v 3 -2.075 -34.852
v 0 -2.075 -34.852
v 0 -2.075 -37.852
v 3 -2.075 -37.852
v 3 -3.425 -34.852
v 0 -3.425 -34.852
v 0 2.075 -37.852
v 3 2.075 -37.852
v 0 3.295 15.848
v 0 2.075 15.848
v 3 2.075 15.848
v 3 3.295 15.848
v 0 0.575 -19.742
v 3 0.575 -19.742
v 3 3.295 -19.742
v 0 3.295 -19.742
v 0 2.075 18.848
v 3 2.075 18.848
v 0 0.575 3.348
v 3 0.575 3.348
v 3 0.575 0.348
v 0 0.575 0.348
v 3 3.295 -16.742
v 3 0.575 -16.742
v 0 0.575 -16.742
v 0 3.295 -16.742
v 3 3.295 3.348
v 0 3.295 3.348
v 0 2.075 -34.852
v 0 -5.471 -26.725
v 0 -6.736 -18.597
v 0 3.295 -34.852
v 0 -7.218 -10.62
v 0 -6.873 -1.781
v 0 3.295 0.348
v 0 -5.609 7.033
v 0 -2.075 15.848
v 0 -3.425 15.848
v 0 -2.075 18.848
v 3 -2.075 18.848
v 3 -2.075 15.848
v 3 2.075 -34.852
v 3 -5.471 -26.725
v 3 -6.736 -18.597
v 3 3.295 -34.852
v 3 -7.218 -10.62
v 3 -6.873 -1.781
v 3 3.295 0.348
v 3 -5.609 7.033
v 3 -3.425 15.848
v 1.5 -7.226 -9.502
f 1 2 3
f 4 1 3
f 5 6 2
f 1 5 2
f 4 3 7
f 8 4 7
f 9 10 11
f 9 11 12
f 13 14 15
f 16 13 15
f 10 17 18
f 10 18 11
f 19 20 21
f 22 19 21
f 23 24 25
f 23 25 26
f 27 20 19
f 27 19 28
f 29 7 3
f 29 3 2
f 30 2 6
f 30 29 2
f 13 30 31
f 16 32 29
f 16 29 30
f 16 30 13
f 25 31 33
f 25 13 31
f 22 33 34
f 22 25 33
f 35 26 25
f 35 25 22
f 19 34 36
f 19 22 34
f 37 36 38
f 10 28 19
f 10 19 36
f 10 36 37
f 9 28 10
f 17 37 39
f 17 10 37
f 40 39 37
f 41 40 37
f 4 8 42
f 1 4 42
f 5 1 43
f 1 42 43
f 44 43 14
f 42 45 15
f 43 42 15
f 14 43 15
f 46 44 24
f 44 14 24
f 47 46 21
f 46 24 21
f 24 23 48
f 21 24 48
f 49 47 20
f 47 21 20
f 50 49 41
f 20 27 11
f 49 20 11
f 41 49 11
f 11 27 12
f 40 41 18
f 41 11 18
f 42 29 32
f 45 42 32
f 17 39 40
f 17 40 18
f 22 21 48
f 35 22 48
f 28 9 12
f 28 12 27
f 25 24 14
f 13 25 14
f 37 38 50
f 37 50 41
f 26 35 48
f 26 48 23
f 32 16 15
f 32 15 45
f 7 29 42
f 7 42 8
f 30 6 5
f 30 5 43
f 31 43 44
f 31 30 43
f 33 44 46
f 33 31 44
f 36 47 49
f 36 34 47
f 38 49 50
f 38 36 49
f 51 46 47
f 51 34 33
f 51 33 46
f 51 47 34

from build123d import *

# Parameters (mm, degrees)
SKICA3_W                 = 50.7
SKICA3_H                 = 6.72
P_IDAT_VYSUNUT_M1_DEPTH  = 3
SKICA3_3_W               = 3
SKICA3_3_H               = 4.15
P_IDAT_VYSUNUT_M2_DEPTH  = 3
SKICA3_4_W               = 3
SKICA3_4_H               = 4.15
P_IDAT_VYSUNUT_M3_DEPTH  = 3
P_IDAT_VYSUNUT_M4_DEPTH  = 3
SKICA5_W                 = 3
SKICA5_H                 = 5.420631859
ODEBRAT_VYSUNUT_M1_DEPTH = 3


with BuildPart() as part:
    # Skica3 → Přidat vysunutím1 (new body)
    with BuildSketch(Plane(origin=(0, 0, 0), x_dir=(0, 0, -1), z_dir=(1, 0, 0))):
        with Locations((9.501921455, -0.065)):
            Rectangle(SKICA3_W, SKICA3_H)
    extrude(amount=P_IDAT_VYSUNUT_M1_DEPTH)

    # Skica3<3> → Přidat vysunutím2 (add)
    with BuildSketch(Plane(origin=(0, 0, 0), x_dir=(0, 0, -1), z_dir=(1, 0, 0))):
        with Locations((36.351921455, 0)):
            Rectangle(SKICA3_3_W, SKICA3_3_H)
    extrude(amount=P_IDAT_VYSUNUT_M2_DEPTH)

    # Skica3<4> → Přidat vysunutím3 (add)
    with BuildSketch(Plane(origin=(0, 0, 0), x_dir=(0, 0, -1), z_dir=(1, 0, 0))):
        with Locations((-17.348078545, 0)):
            Rectangle(SKICA3_4_W, SKICA3_4_H)
    extrude(amount=P_IDAT_VYSUNUT_M3_DEPTH)

    # Skica3<6> → Přidat vysunutím4 (add)
    with BuildSketch(Plane(origin=(0, 0, 0), x_dir=(0, 0, -1), z_dir=(1, 0, 0))):
        with BuildLine():
            Line((34.851921455, -3.425), (-15.848078545, -3.425))
            add(Edge.make_bspline(
                [(34.851921455, -3.425), (9.501921455, -11.026061801), (-15.848078545, -3.425)],
                knots=[0, 0, 0, 1, 1, 1], degree=2))
        make_face()
    extrude(amount=P_IDAT_VYSUNUT_M4_DEPTH)

    # Skica5 → Odebrat vysunutím1 (cut)
    with BuildSketch(Plane(origin=(3, 0, 0), x_dir=(0, 0, -1), z_dir=(1, 0, 0))):
        with Locations((-1.848078545, 3.28531593)):
            Rectangle(SKICA5_W, SKICA5_H)
        with Locations((18.241921455, 3.28531593)):
            Rectangle(SKICA5_W, SKICA5_H)
    extrude(amount=-ODEBRAT_VYSUNUT_M1_DEPTH, mode=Mode.SUBTRACT)


solid = part.part
